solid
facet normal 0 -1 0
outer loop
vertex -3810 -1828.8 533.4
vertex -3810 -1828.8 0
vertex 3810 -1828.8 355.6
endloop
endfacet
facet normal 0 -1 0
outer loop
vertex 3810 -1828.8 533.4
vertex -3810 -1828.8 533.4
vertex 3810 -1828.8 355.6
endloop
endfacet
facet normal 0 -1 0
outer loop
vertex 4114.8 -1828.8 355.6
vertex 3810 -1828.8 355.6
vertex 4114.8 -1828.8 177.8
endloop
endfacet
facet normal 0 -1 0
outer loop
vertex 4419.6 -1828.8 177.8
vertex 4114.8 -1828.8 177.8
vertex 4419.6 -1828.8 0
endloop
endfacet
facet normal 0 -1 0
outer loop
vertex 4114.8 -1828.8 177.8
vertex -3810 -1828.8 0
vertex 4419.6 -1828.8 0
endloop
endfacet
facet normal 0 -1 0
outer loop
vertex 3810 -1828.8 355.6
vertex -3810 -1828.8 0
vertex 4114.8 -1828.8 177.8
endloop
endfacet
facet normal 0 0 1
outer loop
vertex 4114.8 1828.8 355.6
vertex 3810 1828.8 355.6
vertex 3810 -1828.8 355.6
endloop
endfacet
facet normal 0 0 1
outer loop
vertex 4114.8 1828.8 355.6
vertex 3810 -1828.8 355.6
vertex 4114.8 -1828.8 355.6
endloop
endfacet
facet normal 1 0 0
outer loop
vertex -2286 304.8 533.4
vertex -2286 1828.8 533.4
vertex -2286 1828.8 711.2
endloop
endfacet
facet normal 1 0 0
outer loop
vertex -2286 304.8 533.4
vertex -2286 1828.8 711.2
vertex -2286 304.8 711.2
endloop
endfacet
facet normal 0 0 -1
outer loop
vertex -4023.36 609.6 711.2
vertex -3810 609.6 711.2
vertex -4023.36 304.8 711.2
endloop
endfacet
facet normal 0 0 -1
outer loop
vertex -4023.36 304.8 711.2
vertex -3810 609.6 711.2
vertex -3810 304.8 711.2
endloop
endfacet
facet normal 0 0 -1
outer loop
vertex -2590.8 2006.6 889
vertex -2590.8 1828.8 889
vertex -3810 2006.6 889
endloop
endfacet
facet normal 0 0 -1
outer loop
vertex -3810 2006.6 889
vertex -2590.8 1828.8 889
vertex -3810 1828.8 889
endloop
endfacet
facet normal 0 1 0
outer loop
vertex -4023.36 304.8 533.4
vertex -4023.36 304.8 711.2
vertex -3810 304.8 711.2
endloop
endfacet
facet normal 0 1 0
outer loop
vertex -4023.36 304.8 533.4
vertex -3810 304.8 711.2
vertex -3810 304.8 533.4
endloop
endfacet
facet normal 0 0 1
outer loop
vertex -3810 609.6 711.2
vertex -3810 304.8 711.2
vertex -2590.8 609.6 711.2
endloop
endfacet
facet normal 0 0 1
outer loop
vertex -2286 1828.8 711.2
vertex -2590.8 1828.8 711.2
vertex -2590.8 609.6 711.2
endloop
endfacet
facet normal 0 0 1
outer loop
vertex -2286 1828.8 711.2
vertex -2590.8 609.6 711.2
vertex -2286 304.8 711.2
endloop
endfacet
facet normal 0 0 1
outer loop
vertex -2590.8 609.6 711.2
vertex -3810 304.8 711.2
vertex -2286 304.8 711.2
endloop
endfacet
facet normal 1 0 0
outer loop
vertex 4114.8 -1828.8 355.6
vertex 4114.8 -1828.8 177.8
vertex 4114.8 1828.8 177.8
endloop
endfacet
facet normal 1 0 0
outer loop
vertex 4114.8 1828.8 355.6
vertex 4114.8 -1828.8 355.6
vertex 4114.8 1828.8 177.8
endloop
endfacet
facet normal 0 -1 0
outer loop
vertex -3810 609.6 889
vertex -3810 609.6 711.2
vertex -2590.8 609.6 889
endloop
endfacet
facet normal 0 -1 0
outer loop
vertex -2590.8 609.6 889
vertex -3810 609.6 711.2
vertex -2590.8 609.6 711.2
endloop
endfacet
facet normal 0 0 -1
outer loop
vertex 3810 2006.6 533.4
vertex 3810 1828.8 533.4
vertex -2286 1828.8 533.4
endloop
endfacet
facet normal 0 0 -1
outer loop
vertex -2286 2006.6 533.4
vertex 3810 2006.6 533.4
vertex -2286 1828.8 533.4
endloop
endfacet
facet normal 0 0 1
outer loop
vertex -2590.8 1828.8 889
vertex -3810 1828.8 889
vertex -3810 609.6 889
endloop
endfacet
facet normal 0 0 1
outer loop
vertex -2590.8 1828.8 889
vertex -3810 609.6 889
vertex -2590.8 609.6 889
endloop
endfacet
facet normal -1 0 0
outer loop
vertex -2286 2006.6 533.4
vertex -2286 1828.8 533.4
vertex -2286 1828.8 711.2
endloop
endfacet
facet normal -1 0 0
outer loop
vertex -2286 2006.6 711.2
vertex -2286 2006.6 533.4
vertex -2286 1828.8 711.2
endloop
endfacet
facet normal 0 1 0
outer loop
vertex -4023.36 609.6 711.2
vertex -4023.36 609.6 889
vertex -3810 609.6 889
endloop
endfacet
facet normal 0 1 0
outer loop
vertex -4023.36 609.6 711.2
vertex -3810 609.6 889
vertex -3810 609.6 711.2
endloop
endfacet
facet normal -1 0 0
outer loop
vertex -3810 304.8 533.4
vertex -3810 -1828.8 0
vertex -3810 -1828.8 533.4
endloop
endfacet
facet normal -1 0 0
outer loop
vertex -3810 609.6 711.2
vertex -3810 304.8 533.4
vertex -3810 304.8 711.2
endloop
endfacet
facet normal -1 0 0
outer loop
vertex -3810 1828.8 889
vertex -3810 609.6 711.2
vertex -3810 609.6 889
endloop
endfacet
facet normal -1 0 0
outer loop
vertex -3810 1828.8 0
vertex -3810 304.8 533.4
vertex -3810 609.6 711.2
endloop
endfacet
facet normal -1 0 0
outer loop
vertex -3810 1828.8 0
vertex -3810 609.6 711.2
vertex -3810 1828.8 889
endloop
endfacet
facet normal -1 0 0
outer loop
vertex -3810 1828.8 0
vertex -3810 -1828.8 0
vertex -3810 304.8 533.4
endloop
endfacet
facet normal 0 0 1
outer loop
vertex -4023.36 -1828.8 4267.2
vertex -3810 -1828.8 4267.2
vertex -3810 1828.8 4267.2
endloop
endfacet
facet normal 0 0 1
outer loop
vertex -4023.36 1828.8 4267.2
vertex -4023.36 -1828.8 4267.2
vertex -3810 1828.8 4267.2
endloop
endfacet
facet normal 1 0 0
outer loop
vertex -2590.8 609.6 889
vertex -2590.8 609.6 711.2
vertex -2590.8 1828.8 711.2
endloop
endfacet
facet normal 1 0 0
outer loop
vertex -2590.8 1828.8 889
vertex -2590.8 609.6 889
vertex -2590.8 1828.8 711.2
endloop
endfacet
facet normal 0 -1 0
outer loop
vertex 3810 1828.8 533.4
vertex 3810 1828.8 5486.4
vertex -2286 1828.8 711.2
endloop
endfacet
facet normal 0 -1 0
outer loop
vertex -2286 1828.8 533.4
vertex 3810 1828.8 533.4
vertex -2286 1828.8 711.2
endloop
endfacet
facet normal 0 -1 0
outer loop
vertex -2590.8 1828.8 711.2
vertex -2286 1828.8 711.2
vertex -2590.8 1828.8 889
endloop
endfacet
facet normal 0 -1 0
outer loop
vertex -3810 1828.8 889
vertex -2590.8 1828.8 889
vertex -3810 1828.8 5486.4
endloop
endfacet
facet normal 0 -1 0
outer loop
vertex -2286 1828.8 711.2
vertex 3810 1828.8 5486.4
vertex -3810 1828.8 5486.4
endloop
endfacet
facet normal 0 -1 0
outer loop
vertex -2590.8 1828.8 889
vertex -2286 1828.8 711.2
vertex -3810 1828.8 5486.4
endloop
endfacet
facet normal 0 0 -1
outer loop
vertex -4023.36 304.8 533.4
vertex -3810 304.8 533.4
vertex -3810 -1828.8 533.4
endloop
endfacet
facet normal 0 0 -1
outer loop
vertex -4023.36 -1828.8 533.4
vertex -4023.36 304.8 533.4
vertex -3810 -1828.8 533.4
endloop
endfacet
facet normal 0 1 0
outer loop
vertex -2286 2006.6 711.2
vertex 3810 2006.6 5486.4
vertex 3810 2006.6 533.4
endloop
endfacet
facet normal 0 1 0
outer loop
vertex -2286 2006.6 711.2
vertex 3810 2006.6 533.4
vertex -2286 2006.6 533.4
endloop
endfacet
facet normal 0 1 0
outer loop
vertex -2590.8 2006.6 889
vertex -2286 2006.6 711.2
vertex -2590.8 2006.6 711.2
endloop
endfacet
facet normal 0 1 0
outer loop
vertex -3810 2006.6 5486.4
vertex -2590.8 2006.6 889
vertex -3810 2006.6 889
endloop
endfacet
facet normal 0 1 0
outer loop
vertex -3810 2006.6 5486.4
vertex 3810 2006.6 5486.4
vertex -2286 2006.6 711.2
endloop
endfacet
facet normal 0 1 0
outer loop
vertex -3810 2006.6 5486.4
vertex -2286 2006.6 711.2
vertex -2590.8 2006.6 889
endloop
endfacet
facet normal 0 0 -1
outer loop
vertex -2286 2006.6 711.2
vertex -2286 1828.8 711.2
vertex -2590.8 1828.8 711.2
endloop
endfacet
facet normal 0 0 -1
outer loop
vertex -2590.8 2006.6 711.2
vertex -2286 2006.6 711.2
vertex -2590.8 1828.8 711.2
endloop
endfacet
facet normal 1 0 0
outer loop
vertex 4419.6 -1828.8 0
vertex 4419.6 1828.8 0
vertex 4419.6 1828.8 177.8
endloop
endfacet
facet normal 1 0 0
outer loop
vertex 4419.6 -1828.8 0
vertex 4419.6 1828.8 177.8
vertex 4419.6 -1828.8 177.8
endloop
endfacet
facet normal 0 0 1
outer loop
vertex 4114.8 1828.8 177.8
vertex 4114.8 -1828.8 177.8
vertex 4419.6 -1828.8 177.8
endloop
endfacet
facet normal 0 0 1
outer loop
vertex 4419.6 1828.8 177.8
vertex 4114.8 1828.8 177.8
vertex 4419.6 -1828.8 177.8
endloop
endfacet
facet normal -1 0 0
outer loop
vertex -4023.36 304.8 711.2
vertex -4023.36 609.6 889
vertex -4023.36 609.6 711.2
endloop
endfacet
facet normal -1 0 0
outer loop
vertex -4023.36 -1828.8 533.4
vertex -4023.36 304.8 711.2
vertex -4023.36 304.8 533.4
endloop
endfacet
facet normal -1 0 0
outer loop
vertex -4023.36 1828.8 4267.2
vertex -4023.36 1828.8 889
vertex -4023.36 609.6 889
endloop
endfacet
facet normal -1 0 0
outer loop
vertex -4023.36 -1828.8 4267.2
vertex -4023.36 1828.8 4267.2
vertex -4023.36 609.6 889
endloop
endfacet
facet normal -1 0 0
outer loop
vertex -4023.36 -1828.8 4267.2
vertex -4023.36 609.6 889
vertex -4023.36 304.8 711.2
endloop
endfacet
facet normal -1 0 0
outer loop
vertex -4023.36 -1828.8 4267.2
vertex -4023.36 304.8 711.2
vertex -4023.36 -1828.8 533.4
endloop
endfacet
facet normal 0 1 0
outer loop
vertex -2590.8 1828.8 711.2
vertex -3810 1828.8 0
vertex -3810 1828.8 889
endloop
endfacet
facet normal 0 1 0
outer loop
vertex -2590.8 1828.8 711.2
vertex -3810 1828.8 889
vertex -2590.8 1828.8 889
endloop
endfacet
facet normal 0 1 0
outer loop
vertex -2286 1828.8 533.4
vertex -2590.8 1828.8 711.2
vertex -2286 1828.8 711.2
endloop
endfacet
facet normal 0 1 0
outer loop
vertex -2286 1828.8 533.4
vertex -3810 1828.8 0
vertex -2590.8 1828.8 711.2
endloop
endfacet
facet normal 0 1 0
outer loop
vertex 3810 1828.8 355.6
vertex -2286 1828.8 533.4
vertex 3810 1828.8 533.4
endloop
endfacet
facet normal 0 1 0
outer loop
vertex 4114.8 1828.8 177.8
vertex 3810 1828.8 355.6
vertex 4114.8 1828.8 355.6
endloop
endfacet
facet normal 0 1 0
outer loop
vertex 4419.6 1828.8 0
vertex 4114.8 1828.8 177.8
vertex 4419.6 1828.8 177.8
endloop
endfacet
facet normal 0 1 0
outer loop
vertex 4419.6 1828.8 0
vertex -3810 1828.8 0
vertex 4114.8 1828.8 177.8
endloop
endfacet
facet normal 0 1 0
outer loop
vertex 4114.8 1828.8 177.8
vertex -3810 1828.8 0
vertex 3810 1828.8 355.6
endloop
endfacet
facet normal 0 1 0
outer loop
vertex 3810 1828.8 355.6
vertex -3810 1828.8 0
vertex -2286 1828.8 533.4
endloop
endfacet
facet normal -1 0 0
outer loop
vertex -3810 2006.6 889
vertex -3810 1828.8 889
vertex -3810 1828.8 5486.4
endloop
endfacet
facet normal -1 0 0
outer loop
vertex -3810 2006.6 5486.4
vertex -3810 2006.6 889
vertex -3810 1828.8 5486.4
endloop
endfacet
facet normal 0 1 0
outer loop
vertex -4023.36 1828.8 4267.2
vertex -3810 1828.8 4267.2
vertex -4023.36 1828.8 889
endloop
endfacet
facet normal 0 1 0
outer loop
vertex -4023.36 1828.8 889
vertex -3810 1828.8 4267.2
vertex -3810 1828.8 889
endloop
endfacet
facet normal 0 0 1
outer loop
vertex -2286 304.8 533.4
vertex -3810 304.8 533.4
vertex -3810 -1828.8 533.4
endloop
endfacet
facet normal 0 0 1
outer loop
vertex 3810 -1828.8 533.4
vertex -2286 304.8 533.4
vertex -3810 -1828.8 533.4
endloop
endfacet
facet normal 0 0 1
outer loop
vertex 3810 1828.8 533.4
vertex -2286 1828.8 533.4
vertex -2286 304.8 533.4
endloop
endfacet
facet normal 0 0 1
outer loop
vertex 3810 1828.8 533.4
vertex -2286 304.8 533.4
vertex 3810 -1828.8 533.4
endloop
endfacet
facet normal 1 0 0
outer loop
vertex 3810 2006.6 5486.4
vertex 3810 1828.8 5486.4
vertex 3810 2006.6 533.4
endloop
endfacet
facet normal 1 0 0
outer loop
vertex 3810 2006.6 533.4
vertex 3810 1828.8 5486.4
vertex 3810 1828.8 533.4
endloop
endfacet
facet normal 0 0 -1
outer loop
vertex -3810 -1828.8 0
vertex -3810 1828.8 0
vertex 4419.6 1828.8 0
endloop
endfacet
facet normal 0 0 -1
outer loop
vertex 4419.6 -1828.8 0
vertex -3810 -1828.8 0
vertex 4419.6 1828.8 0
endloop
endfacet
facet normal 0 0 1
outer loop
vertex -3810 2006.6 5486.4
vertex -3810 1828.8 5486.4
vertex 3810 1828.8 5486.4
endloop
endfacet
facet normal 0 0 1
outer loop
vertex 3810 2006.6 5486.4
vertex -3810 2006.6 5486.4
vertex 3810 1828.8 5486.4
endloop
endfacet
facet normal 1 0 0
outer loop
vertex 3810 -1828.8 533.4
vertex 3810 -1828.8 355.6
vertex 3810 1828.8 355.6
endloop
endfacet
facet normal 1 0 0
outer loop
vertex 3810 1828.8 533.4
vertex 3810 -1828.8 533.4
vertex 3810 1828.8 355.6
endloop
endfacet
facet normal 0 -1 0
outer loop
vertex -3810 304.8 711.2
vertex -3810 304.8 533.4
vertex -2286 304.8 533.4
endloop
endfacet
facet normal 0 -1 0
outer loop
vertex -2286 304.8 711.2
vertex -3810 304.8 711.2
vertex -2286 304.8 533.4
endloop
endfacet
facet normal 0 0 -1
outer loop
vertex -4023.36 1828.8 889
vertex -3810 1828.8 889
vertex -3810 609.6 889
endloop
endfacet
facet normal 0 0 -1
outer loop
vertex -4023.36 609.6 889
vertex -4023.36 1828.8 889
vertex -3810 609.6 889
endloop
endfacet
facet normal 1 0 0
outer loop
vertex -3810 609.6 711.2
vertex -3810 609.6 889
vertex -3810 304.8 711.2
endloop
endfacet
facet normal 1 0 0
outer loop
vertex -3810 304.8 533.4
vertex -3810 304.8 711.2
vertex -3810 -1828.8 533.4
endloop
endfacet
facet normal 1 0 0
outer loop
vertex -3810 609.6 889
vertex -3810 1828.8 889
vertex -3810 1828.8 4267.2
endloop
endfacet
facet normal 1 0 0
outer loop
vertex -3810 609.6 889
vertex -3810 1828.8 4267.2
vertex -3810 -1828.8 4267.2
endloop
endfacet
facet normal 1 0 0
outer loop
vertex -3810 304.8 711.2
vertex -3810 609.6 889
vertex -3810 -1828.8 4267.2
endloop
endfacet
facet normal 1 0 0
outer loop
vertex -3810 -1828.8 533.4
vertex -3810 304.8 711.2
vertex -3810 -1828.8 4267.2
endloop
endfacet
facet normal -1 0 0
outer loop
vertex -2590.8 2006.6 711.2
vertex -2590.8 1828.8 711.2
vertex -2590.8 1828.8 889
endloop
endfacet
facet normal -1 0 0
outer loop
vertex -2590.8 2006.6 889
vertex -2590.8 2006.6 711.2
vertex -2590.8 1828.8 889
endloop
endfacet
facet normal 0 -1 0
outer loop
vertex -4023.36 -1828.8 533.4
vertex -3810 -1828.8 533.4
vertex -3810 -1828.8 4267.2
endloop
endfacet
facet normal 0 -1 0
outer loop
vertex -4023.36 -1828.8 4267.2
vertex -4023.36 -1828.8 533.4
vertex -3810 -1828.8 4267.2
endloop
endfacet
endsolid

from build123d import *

# Parameters (mm, degrees)
F0_W      = 7620
F0_H      = 3657.6
F1_DEPTH  = 533.4
F2_W      = 7620
F2_H      = 3657.6
F2_W_2    = 609.6
F3_DEPTH  = 177.8
F4_W      = 1219.2
F4_H      = 1219.2
F5_DEPTH  = 355.6
F6_W      = 1524
F6_H      = 1524
F7_DEPTH  = 711.2
F9_DEPTH  = 177.8
F11_DEPTH = 213.36
F12_W     = 304.8
F12_H     = 3657.6
F13_DEPTH = 177.8


with BuildPart() as f1:
    # F0 (on Top) → F1 (new body)
    with BuildSketch(Plane.XY):
        Rectangle(F0_W, F0_H)
    extrude(amount=F1_DEPTH)

    # F2 (on face) → F3 (join)
    with BuildSketch(Plane(origin=(0, 0, 0), x_dir=(1, 0, 0), z_dir=(0, 0, -1))):
        Rectangle(F2_W, F2_H)
        with Locations((4114.8, 0)):
            Rectangle(F2_W_2, F2_H)
    extrude(amount=-F3_DEPTH)

    # F4 (on face) → F5 (join)
    with BuildSketch(Plane.XY.offset(533.4)):
        with Locations((-3200.4, 1219.2)):
            Rectangle(F4_W, F4_H)
    extrude(amount=F5_DEPTH)

    # F6 (on face) → F7 (join)
    with BuildSketch(Plane(origin=(0, 0, 0), x_dir=(1, 0, 0), z_dir=(0, 0, -1))):
        with Locations((-3048, -1066.8)):
            Rectangle(F6_W, F6_H)
    extrude(amount=-F7_DEPTH)

    # F12 (on face) → F13 (join)
    with BuildSketch(Plane.XY.offset(177.8)):
        with Locations((3962.4, 0)):
            Rectangle(F12_W, F12_H)
    extrude(amount=F13_DEPTH)


with BuildPart() as f9:
    # F8 (on face) → F9 (new body)
    with BuildSketch(Plane(origin=(0, 1828.8, 0), x_dir=(-1, 0, 0), z_dir=(0, 1, 0))):
        Polygon((2590.8, 889), (3810, 889), (3810, 5486.4), (-3810, 5486.4), (-3810, 533.4), (2286, 533.4), (2286, 711.2), (2590.8, 711.2), align=None)
    extrude(amount=F9_DEPTH)


with BuildPart() as f11:
    # F10 (on face) → F11 (new body)
    with BuildSketch(Plane(origin=(-3810, 0, 0), x_dir=(0, -1, 0), z_dir=(-1, 0, 0))):
        Polygon((-1828.8, 4267.2), (-1828.8, 889), (-609.6, 889), (-609.6, 711.2), (-304.8, 711.2), (-304.8, 533.4), (1828.8, 533.4), (1828.8, 4267.2), align=None)
    extrude(amount=F11_DEPTH)


solid = Compound([f1.part, f9.part, f11.part])
